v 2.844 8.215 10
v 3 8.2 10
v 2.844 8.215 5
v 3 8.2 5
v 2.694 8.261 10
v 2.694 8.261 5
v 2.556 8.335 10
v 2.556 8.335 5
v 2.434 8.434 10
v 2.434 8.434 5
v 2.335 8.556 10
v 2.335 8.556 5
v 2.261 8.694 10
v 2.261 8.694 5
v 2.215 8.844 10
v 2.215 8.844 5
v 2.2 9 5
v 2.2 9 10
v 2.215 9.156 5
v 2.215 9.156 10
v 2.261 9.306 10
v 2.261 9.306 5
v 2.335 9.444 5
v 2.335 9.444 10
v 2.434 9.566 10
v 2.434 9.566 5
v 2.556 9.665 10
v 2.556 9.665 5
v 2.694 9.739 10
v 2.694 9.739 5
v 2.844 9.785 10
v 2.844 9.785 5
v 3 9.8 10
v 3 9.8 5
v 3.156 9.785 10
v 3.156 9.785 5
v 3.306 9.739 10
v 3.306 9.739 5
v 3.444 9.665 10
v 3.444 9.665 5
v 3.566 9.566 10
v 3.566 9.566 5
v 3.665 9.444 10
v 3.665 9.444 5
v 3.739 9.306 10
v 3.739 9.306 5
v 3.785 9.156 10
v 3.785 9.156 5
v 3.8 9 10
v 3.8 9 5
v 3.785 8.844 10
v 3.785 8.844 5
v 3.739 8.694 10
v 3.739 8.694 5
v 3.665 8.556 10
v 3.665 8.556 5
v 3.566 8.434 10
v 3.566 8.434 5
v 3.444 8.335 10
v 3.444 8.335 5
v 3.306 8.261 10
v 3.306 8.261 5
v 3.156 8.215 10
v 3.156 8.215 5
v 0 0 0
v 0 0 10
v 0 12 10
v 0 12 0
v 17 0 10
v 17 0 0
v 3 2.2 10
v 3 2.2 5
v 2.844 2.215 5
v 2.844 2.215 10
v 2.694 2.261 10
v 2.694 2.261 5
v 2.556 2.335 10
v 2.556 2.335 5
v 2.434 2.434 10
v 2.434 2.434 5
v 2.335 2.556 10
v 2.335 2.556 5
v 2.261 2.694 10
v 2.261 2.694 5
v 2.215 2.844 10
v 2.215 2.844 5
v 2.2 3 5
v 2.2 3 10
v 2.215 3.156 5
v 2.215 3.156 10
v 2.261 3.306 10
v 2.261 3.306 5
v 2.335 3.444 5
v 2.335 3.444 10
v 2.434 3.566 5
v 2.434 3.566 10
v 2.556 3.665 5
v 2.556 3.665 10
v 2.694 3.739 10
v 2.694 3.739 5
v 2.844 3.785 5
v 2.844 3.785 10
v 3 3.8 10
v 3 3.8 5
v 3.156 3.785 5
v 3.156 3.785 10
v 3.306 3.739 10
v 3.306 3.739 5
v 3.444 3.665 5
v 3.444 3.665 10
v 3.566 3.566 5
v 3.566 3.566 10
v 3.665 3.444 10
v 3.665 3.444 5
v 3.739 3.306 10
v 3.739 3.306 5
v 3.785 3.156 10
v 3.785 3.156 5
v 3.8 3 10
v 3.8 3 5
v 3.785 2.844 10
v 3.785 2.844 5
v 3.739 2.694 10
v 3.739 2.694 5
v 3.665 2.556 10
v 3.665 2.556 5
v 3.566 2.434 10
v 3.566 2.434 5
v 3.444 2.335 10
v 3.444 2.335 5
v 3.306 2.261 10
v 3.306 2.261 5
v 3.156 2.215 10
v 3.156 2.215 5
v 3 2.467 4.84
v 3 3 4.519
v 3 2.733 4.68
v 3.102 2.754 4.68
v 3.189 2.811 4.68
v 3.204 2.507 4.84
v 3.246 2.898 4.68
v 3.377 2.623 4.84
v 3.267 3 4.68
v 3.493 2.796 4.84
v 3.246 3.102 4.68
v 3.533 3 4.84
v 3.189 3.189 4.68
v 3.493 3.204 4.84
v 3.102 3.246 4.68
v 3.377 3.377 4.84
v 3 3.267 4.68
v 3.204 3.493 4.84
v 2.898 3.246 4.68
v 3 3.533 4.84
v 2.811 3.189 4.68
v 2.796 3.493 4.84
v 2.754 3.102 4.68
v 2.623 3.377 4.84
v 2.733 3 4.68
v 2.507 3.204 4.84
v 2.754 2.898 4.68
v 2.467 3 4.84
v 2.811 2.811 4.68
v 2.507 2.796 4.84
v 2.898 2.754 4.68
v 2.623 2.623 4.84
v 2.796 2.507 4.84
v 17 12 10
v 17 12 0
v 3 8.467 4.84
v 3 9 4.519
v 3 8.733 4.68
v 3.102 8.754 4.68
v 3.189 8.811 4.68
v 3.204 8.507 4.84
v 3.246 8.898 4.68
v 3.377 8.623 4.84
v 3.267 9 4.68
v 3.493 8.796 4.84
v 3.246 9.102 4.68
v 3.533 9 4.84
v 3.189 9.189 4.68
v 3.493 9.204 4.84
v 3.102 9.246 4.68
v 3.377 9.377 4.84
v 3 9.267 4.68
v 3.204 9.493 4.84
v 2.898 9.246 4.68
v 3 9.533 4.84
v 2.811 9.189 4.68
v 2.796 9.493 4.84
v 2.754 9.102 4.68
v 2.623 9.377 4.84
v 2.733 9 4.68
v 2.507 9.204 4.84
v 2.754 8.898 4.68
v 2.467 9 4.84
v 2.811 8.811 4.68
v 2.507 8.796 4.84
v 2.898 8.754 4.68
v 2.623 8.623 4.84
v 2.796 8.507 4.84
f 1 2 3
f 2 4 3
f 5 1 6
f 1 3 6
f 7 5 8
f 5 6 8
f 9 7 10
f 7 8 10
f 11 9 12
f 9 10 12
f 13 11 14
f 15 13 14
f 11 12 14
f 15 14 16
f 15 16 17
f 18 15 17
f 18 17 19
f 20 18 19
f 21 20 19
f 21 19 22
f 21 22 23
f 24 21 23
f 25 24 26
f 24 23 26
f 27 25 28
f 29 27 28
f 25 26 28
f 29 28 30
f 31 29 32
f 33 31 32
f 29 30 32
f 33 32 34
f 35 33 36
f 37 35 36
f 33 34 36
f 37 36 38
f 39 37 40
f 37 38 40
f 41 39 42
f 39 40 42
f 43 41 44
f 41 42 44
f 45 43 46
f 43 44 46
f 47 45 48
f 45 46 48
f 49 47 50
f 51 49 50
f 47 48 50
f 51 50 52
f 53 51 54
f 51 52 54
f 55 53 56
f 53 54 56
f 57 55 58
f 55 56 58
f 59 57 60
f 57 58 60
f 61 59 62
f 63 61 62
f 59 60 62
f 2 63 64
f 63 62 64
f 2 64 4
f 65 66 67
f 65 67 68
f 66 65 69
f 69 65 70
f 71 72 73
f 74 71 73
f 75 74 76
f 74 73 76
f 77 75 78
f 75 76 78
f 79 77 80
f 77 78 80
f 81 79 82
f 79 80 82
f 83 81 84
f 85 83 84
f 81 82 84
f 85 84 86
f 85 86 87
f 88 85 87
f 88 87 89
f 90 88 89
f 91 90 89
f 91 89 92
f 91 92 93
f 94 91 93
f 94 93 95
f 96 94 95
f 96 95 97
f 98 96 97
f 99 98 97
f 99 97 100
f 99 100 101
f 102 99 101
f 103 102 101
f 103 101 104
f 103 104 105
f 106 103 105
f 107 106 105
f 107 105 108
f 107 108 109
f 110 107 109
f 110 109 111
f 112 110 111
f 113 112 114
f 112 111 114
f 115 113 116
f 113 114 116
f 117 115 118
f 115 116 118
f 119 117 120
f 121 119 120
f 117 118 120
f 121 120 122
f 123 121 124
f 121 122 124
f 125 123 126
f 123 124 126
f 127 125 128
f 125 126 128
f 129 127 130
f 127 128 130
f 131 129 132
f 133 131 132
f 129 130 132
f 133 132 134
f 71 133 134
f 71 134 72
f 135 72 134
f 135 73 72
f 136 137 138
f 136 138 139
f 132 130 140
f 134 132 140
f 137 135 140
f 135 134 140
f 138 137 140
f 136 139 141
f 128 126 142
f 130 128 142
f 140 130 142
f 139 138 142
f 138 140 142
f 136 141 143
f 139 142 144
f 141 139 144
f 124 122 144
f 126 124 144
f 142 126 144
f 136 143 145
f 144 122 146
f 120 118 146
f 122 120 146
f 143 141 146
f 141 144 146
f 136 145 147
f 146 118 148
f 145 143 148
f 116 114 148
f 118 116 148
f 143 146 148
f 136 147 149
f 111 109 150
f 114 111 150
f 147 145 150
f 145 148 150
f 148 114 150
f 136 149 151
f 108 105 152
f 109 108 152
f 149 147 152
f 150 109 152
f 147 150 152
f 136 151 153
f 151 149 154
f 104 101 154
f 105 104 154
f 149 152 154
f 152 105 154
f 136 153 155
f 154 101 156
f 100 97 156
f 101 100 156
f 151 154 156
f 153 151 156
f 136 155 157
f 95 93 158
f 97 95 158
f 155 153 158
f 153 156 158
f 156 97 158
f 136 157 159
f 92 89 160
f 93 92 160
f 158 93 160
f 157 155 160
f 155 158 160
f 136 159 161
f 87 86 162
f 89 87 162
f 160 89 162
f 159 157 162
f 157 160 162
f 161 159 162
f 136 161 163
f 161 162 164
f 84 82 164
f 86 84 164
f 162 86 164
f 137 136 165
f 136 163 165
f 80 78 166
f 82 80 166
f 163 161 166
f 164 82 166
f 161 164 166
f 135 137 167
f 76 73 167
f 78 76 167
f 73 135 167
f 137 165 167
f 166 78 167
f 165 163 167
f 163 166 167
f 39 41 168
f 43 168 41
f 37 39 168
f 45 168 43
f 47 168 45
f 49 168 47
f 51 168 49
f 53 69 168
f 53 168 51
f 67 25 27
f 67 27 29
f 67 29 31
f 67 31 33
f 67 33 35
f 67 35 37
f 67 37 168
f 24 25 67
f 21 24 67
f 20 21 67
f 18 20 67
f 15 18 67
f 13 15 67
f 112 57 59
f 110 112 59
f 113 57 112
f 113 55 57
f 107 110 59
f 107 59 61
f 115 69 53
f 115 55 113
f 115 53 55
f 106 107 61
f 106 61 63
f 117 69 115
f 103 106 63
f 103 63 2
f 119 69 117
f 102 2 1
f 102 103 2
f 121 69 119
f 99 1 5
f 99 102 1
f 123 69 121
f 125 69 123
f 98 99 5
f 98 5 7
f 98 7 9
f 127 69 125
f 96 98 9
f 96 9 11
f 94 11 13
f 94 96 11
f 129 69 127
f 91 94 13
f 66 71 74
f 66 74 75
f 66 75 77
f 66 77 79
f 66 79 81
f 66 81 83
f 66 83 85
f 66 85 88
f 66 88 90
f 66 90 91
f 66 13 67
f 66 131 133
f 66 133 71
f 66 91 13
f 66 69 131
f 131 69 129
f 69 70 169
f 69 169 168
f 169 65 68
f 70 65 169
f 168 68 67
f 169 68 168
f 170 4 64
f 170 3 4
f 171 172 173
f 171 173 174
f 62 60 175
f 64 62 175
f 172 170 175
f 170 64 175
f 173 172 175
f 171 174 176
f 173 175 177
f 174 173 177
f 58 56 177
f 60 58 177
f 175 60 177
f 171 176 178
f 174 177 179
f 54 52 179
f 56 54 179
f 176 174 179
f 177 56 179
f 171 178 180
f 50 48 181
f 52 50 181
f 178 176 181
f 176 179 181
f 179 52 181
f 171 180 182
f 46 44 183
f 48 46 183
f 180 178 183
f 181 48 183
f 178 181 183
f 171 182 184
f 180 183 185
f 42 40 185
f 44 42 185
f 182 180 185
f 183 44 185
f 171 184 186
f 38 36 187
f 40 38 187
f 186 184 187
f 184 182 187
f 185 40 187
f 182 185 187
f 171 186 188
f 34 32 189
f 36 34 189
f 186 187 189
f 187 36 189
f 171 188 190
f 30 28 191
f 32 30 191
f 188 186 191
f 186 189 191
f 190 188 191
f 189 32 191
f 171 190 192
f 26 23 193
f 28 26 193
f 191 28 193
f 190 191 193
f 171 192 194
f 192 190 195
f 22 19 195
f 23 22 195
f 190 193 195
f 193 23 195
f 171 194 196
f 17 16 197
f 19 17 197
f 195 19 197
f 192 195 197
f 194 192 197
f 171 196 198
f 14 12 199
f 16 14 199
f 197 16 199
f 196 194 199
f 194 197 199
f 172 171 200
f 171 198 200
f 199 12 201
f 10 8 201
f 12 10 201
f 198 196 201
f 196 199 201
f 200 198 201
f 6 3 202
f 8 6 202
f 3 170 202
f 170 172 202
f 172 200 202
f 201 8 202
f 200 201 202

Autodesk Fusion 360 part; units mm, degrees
sketch "Sketch1" plane through (0, 0, 0) normal (0, 1, 0) x (1, 0, 0)
  line L0 (0, 0) -> (17, 0)
  line L1 (17, 0) -> (17, -10)
  line L2 (17, -10) -> (0, -10)
  line L3 (0, -10) -> (0, 0)
  dimension "d1" = 17
  dimension "d2" = 10
extrude "Extrude1" add sketch "Sketch1" along normal blind 12
sketch "Sketch2" plane through (0, 0, 10) normal (0, 0, 1) x (1, 0, 0)
  line L0 (0, 0) -> (17, 0)
  line L1 (17, 0) -> (17, 12)
  line L2 (17, 12) -> (0, 12)
  line L3 (0, 12) -> (0, 0)
  point P0 (3, 3)
  point P1 (3, 9)
  dimension "d5" = 3
  dimension "d6" = 3
  dimension "d7" = 6
hole "Hole1" at (3, 3, 10) direction (0, 0, -1) diameter 1.6 depth 5 tip angle 118
hole "Hole2" at (3, 9, 10) direction (0, 0, -1) diameter 1.6 depth 5 tip angle 118
